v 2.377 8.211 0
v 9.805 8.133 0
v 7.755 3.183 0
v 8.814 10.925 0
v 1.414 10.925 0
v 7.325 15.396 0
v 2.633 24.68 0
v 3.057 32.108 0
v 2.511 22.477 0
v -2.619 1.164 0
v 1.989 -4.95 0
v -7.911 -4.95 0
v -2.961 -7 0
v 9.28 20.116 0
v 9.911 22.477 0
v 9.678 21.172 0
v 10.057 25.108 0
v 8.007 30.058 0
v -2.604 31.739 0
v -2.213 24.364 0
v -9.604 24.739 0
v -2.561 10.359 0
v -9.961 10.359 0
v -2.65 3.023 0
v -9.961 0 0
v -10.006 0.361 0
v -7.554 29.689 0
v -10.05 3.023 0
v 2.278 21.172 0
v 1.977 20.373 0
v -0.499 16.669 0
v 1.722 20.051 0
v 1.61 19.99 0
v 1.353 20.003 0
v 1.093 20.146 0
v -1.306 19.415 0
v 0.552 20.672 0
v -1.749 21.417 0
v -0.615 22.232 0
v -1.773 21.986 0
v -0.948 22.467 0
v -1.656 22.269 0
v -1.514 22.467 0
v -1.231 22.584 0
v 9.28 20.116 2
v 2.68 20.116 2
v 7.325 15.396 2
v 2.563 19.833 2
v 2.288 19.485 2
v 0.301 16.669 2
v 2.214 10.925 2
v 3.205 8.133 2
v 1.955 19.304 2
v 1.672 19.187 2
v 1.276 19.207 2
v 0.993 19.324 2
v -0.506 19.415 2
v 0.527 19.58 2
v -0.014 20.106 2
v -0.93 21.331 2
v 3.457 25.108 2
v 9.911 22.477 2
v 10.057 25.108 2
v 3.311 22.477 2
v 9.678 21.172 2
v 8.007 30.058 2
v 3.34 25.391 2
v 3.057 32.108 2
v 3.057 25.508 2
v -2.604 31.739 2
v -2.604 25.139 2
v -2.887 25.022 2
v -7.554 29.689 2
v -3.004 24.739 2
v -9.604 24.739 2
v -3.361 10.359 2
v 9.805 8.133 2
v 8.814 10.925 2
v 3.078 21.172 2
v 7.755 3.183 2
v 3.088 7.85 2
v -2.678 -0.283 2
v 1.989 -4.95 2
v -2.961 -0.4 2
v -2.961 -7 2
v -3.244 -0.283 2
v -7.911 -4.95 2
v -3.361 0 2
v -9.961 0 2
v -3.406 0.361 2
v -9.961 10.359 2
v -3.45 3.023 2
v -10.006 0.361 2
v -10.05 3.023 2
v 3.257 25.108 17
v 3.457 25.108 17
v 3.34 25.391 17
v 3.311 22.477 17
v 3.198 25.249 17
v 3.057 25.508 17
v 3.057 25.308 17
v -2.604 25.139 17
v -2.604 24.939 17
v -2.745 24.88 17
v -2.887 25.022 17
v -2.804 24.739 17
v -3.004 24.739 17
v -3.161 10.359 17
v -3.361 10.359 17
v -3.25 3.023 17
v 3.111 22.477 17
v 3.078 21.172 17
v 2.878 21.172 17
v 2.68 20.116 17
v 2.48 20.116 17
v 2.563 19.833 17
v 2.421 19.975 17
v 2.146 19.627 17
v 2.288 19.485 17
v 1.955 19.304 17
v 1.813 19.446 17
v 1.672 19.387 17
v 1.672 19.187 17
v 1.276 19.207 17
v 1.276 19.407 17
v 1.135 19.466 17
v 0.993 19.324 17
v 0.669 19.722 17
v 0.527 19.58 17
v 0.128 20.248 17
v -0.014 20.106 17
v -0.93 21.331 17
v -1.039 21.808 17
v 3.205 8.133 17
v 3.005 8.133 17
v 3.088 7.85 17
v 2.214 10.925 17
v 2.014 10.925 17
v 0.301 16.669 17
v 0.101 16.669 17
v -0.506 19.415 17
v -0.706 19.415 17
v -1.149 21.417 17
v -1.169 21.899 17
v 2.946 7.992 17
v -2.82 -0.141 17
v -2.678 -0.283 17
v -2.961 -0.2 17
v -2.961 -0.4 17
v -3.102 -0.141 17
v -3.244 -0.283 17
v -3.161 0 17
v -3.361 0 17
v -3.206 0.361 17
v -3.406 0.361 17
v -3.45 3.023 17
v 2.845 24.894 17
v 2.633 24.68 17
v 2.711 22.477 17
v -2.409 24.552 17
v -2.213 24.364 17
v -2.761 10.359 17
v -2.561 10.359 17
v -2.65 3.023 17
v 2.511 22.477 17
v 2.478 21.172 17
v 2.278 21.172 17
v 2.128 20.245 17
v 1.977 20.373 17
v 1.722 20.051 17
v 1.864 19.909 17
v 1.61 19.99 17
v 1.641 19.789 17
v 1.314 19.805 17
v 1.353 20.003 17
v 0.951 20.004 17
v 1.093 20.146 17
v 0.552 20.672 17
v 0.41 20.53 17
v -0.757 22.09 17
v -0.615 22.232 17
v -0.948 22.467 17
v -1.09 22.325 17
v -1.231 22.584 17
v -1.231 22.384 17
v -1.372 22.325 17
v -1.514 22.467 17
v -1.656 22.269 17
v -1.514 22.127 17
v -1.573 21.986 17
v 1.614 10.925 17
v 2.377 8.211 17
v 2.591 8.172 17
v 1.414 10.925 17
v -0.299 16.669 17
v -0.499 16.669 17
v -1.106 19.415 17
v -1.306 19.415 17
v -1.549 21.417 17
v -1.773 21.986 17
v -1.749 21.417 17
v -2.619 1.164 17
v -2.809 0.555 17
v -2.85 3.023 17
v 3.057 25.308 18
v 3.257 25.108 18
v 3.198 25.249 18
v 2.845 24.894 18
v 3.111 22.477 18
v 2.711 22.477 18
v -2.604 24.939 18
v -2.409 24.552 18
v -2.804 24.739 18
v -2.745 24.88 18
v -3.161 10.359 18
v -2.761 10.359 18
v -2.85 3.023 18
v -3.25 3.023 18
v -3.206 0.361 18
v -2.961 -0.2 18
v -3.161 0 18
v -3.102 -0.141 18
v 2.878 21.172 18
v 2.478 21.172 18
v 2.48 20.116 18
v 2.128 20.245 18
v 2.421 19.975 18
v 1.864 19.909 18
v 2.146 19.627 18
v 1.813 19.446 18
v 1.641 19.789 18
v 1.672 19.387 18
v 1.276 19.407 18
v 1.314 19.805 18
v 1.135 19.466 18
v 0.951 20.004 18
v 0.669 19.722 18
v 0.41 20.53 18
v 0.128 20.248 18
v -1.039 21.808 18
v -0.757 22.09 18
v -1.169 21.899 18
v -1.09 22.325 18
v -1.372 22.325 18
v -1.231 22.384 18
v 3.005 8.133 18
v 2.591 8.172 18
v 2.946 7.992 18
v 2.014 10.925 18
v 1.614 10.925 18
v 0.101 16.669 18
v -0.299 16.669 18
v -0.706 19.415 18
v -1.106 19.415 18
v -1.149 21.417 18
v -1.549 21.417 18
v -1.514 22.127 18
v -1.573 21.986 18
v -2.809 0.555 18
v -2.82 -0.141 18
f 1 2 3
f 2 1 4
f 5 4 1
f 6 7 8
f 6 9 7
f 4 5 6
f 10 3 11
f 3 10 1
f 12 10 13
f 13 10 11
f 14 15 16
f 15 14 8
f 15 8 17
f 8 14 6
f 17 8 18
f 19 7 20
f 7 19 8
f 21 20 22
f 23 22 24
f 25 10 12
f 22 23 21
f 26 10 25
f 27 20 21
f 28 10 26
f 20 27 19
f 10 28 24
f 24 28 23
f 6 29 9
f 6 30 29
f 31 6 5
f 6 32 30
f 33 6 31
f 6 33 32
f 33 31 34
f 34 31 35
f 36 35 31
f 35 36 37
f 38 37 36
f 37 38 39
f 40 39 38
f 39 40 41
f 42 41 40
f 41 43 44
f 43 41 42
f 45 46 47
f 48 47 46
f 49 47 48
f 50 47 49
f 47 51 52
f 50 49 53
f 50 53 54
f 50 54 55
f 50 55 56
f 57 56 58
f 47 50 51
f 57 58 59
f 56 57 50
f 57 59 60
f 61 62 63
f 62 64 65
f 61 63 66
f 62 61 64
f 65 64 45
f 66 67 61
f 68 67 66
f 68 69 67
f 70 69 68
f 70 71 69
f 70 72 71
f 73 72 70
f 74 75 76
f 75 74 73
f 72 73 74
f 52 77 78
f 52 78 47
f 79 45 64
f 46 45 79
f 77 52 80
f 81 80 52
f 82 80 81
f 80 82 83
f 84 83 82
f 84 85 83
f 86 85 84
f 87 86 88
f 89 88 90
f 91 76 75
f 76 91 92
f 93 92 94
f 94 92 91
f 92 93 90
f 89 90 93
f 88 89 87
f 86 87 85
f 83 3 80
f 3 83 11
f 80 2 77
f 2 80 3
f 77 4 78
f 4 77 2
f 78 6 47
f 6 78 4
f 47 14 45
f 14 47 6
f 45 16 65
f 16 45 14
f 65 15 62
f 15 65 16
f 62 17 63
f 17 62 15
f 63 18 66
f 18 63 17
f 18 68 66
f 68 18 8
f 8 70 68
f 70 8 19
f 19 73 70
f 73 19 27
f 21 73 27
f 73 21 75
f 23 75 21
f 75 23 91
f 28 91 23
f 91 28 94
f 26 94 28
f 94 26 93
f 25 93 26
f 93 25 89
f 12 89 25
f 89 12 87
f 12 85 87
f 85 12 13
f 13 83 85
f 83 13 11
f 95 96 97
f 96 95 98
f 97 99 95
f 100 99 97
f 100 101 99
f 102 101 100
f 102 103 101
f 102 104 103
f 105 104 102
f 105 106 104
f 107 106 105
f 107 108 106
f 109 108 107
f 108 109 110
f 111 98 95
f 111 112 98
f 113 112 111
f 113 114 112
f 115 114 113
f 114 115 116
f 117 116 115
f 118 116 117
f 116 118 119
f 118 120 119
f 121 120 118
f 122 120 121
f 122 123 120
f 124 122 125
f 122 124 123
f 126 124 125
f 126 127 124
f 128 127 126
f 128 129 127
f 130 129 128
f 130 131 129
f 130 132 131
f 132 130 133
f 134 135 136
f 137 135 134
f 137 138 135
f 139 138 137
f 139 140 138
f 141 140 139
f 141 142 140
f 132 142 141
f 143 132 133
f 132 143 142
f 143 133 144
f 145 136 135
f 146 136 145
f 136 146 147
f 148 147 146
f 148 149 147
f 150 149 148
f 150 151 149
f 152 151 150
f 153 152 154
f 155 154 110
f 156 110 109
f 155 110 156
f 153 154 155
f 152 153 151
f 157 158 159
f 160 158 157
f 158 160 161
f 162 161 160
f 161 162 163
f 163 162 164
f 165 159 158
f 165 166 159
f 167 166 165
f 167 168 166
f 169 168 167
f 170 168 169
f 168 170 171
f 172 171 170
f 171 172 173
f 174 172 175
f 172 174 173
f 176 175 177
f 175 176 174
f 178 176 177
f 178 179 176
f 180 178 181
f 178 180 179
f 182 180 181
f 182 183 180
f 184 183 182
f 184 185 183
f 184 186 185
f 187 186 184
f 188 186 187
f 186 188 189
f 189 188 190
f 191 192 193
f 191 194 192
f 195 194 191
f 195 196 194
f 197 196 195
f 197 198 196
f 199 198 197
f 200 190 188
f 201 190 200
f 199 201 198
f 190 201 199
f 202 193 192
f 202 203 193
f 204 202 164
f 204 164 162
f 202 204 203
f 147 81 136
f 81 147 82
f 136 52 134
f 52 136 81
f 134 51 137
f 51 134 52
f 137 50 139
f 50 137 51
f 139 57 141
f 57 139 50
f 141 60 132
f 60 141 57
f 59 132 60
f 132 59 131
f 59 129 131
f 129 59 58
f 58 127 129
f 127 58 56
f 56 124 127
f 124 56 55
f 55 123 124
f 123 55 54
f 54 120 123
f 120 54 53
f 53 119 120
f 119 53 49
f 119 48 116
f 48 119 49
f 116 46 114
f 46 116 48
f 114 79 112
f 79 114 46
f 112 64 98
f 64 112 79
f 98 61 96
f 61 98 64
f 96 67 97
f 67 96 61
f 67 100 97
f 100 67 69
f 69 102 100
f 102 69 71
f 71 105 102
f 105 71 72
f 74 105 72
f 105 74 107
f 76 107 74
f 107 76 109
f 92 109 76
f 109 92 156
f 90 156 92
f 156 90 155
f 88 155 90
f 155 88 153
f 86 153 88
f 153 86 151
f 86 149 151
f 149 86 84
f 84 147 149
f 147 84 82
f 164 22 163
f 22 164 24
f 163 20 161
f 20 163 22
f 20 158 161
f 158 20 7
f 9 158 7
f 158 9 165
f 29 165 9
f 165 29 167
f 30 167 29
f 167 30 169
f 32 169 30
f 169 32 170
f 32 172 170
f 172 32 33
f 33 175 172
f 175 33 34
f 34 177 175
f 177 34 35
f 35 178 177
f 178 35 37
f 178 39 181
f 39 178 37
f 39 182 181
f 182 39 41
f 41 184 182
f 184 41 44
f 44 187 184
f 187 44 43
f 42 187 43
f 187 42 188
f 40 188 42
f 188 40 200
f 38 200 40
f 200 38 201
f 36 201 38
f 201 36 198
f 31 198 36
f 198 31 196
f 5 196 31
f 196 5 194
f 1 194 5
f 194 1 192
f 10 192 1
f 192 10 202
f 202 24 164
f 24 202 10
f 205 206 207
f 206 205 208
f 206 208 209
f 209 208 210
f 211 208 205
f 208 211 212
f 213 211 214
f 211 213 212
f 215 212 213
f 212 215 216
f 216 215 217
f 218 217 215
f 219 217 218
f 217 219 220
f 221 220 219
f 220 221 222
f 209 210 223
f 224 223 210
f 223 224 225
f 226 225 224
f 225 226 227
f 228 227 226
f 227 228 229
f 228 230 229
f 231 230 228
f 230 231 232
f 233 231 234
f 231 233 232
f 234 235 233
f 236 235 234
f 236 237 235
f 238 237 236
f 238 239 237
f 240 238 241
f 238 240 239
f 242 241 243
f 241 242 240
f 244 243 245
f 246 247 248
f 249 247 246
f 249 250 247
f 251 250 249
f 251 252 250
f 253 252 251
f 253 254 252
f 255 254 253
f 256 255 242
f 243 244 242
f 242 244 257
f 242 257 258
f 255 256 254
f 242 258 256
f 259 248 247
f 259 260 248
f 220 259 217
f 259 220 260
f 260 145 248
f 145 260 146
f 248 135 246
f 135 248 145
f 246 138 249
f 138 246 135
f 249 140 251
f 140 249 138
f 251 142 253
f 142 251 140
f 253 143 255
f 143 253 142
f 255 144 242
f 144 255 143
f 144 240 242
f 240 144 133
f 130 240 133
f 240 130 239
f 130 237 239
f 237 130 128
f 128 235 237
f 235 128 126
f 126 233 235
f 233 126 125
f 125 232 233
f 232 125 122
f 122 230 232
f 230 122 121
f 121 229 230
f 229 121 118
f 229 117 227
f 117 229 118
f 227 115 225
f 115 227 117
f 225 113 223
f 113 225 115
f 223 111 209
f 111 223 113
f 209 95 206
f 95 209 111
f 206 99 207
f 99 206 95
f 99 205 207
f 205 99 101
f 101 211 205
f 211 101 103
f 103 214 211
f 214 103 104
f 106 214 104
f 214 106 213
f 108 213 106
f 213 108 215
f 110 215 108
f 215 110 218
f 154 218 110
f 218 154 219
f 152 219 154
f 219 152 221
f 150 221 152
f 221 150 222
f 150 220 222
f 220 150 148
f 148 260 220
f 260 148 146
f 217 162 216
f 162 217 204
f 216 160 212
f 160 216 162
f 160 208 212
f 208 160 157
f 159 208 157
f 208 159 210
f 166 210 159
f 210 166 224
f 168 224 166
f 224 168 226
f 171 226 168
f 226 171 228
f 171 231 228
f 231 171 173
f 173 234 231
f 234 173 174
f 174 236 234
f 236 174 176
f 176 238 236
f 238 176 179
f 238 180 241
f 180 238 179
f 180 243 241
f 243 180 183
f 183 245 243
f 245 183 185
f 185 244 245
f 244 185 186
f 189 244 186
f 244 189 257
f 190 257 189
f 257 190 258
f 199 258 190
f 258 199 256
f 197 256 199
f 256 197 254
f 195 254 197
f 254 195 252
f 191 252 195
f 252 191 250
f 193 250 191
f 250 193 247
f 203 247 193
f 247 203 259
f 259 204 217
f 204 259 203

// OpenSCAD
//!OpenSCAD
edgeThickness = 0.4;
cutter_sizes = 4;
wallHeight = 17;
wallFlareWidth = 14;
wallFlareThickness = 2;
minWallWidth = .8;
maxWallWidth = .8;
insideWallFlareWidth = 1;
insideWallFlareThickness = 1.5;
minInsideWallWidth = 1;
maxInsideWallWidth = 3;
featureHeight = 14;
minFeatureThickness = 0.8;
maxFeatureThickness = 0.8;
connectorThickness = 2;
size = 25.4*cutter_sizes;

module dummy() {}

//scaling = size/25.108;
scaling=1;

module ribbon(points, thickness=1, closed=false) {
    p = closed ? concat(points, [points[0]]) : points;
    
    union() {
        for (i=[1:len(p)-1]) {
            hull() {
                translate(p[i-1]) circle(d=thickness, $fn=8);
                translate(p[i]) circle(d=thickness, $fn=8);
            }
        }
    }
}

module cookieCutter() {

path0=[[-2.604,305.284],[-2.961,290.904],[-3.050,283.568],[-3.006,280.906],[-2.961,280.545],[2.805,288.678],[1.814,291.470],[-0.099,297.214],[-0.906,299.960],[-1.349,301.962],[-1.373,302.531],[-1.231,302.729],[-0.898,302.494],[0.269,300.934],[0.810,300.408],[1.276,300.152],[1.672,300.132],[2.005,300.313],[2.280,300.661],[2.678,301.717],[2.911,303.022],[3.057,305.653],[-2.604,305.284]];
render(convexity=10) linear_extrude(height=(wallHeight)) ribbon(path0,thickness=min(maxWallWidth,max(0.001,minWallWidth)));
render(convexity=10) linear_extrude(height=(wallHeight+1)) ribbon(path0,thickness=edgeThickness);
difference() {
 render(convexity=10) linear_extrude(height=wallFlareThickness) ribbon(path0,thickness=wallFlareWidth);
 translate([0,0,-0.01]) linear_extrude(height=wallFlareThickness+0.02) polygon(points=path0);
}
}

translate([0,-280.545*scaling,0]) cookieCutter();
